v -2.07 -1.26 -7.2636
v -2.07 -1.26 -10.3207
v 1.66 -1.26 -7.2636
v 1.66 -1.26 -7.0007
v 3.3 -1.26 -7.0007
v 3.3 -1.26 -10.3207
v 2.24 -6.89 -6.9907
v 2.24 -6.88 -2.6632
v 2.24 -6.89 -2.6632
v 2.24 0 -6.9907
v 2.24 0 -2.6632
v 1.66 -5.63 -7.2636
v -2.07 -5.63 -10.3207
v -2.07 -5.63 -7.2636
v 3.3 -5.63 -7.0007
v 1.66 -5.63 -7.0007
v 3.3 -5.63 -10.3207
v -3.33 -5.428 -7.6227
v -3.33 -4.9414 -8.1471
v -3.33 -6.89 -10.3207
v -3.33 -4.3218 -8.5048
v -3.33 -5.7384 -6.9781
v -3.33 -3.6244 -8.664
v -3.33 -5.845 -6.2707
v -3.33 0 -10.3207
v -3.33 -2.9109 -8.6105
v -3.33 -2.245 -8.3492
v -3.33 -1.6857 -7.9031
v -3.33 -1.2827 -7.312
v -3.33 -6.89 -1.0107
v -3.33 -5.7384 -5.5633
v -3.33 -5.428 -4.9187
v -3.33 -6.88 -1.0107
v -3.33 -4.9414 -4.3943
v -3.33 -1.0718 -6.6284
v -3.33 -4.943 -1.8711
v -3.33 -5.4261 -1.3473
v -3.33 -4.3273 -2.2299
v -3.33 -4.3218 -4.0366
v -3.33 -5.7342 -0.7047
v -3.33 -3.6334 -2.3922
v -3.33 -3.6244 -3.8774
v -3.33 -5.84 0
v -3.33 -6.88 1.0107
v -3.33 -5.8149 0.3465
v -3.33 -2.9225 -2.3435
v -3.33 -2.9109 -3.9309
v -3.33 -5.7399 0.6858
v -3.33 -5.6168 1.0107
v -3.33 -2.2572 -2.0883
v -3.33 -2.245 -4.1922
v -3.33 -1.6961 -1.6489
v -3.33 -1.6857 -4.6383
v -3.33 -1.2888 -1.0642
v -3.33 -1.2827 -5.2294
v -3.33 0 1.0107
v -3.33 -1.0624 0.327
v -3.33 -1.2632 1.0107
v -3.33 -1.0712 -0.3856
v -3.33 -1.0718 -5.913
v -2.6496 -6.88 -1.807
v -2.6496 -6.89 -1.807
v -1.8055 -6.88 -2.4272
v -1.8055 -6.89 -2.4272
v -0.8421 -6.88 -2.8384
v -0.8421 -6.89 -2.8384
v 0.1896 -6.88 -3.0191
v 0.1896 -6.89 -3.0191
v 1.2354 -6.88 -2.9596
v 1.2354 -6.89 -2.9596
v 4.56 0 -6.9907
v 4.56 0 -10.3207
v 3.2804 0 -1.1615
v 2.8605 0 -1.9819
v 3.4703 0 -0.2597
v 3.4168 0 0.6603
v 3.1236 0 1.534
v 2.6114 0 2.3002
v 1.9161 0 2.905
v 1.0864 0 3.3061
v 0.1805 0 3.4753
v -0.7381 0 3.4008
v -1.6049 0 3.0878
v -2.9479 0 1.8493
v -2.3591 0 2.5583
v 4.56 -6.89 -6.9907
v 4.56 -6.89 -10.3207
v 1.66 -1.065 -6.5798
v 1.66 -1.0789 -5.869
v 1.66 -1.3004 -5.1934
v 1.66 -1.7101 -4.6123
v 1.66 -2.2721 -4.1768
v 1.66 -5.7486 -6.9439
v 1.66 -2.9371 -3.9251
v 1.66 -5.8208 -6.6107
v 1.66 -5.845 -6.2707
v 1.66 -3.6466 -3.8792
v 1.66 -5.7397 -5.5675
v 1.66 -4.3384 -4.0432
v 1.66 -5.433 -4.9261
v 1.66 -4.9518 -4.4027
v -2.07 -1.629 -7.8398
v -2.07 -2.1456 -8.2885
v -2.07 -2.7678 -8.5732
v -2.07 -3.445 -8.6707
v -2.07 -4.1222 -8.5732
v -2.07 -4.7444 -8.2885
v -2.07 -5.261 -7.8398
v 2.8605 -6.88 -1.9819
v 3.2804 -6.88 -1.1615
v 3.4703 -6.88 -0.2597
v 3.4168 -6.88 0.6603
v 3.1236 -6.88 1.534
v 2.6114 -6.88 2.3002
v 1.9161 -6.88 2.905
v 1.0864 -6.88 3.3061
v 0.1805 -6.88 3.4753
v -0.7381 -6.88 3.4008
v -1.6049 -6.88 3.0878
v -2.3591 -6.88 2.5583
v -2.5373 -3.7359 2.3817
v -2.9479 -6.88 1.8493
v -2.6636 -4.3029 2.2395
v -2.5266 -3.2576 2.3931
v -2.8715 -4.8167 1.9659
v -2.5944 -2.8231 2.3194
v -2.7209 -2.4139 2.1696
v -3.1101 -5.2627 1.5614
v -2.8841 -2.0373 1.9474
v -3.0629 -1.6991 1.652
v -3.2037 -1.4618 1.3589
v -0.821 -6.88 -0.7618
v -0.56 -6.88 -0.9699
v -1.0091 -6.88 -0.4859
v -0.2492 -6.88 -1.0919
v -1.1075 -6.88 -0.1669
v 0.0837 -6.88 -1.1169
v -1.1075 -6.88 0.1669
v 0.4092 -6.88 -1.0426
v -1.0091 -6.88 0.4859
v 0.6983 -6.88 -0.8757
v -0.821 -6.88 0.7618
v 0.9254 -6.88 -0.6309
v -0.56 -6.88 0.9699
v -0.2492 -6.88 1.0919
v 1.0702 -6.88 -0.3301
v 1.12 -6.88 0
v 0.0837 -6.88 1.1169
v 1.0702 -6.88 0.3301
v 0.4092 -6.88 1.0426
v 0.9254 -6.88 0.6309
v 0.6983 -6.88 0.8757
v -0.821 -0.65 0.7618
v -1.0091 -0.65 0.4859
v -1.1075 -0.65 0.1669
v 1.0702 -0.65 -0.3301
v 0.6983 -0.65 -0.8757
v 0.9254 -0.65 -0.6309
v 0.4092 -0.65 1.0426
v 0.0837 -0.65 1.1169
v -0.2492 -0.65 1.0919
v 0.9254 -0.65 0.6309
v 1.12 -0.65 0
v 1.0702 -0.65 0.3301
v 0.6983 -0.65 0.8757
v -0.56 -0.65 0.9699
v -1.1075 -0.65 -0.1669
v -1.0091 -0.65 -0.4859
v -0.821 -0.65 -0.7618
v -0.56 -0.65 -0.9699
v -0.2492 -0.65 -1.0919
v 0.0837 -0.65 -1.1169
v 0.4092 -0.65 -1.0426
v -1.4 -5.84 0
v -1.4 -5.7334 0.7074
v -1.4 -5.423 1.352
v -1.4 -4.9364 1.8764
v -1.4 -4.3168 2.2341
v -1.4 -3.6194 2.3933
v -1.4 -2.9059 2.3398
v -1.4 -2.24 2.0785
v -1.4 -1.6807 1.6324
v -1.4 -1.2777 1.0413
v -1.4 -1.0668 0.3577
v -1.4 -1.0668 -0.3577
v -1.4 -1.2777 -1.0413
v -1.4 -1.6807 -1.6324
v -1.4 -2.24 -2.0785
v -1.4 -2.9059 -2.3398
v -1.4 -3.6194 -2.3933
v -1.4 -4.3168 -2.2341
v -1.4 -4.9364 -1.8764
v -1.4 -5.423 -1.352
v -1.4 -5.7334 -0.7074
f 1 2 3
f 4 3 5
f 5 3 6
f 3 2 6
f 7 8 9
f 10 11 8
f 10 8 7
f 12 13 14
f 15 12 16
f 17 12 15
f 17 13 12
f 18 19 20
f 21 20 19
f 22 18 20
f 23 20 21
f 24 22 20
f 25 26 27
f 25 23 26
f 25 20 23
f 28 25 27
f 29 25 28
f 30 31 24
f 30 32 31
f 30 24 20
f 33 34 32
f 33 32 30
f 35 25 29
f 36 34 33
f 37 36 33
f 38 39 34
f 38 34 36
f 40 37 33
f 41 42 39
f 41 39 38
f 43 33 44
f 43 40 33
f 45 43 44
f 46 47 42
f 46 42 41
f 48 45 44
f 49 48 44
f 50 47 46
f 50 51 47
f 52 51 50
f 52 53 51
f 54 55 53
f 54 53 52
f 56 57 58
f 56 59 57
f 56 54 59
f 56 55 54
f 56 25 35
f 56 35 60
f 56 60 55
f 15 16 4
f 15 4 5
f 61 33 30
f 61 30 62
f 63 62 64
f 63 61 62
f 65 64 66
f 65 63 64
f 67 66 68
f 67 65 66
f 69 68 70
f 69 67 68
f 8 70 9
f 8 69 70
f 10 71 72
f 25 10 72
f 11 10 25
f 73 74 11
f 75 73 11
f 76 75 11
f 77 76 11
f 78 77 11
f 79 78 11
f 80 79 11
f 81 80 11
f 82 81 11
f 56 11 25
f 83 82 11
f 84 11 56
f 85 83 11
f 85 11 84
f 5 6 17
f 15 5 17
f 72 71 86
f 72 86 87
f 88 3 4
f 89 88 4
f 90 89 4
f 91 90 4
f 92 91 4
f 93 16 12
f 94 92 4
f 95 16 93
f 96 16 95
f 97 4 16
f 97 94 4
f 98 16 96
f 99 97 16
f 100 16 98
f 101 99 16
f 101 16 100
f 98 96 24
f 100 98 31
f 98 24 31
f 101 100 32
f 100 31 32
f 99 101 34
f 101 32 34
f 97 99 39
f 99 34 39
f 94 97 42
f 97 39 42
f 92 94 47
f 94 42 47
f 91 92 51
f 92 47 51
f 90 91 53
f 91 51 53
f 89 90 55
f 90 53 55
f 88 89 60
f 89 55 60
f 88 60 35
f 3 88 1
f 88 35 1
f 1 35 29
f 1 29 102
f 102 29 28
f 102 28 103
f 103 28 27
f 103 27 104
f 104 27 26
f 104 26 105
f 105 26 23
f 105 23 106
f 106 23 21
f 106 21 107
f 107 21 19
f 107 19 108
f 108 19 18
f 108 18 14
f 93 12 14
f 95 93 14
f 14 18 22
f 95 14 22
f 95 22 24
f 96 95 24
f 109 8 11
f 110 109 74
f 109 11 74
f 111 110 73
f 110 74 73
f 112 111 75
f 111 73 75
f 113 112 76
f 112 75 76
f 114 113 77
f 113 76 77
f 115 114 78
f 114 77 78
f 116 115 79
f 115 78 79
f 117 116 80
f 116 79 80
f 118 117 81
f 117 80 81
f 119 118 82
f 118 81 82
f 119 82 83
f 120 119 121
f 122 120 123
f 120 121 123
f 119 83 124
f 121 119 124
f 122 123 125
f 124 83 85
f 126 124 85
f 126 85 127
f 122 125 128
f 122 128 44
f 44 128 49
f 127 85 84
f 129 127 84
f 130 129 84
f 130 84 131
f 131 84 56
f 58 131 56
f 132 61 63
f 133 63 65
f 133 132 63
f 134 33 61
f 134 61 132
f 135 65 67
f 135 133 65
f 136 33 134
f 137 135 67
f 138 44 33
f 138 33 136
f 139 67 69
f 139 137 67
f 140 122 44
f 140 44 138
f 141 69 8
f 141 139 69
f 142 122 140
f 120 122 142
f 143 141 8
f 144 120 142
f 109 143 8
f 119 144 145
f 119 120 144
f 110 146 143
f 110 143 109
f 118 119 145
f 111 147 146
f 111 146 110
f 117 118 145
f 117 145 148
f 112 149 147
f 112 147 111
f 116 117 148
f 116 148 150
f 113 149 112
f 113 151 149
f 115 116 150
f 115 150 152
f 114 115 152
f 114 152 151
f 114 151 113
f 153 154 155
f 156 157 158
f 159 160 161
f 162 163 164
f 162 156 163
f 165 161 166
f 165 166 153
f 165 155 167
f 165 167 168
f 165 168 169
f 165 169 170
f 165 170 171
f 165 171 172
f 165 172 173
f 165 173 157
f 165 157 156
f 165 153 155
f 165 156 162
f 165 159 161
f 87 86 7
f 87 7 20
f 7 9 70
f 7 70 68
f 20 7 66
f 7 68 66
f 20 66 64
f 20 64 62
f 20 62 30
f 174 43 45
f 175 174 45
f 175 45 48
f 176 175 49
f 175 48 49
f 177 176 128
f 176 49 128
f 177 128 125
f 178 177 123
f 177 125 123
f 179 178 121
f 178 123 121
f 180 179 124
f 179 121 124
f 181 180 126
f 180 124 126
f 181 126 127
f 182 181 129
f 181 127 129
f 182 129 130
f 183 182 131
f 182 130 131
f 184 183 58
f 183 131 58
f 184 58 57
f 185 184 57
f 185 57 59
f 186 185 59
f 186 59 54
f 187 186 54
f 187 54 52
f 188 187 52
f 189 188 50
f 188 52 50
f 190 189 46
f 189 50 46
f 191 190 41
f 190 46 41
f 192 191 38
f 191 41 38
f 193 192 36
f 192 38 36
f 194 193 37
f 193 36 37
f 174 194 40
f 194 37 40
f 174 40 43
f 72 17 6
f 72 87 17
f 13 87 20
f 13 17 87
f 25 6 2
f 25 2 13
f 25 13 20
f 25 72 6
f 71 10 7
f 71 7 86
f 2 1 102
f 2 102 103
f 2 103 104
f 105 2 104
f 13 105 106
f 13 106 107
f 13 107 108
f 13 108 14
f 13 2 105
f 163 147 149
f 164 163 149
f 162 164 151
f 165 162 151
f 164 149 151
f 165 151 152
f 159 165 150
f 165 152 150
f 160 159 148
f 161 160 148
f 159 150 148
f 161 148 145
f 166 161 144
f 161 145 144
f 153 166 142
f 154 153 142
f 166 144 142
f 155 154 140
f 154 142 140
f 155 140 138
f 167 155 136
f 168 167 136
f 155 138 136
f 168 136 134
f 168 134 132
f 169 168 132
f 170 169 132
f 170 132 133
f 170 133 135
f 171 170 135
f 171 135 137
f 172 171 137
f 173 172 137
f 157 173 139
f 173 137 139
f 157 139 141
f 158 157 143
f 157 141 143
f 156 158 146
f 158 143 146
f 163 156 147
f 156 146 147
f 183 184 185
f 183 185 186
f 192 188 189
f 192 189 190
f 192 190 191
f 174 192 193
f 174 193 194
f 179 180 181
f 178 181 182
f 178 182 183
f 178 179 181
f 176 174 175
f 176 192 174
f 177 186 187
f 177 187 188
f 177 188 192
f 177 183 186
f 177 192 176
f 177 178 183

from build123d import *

# Parameters (mm, degrees)
F0_R      = 3.48
F1_DEPTH  = 6.88
F3_DEPTH  = 6.881
F5_DEPTH  = 6.89
F6_W      = 5.37
F6_H      = 4.37
F7_DEPTH  = 3.32
F8_R      = 2.4
F9_DEPTH  = 1.93
F10_R     = 2.4
F11_DEPTH = 4.99
F12_R     = 1.12
F13_DEPTH = 6.23


with BuildPart() as f1:
    # F0 (on Front) → F1 (new body)
    with BuildSketch(Plane.XZ):
        Circle(F0_R)
    extrude(amount=F1_DEPTH)

    # F2 (on face) → F3 (cut, through all)
    with BuildSketch(Plane(origin=(0, 0, 0), x_dir=(-1, 0, 0), z_dir=(0, 1, 0))):
        Polygon((4.844351, 2.141895), (3.33, 4.121852), (3.33, -5.87584), align=None)
    extrude(amount=-F3_DEPTH, mode=Mode.SUBTRACT)

    # F4 (on face) → F5 (join)
    with BuildSketch(Plane(origin=(0, 0, 0), x_dir=(-1, 0, 0), z_dir=(0, 1, 0))):
        with BuildLine():
            Line((3.33, -10.320693), (3.33, -1.010693))
            ThreePointArc((3.33, -1.010693), (0.84212, -2.838426), (-2.24, -2.663231))
            Line((-2.24, -2.663231), (-2.24, -6.990693))
            Line((-2.24, -6.990693), (-4.56, -6.990693))
            Line((-4.56, -6.990693), (-4.56, -10.320693))
            Line((-4.56, -10.320693), (3.33, -10.320693))
        make_face()
    extrude(amount=-F5_DEPTH)

    # F6 (on face) → F7 (cut)
    with BuildSketch(Plane(origin=(0, 0, -10.320693), x_dir=(1, 0, 0), z_dir=(0, 0, -1))):
        with Locations((0.615, 3.445)):
            Rectangle(F6_W, F6_H)
    extrude(amount=-F7_DEPTH, mode=Mode.SUBTRACT)

    # F8 (on face) → F9 (cut)
    with BuildSketch(Plane(origin=(-3.33, 0, 0), x_dir=(0, -1, 0), z_dir=(-1, 0, 0))):
        with Locations((3.44, 0)):
            Circle(F8_R)
    extrude(amount=-F9_DEPTH, mode=Mode.SUBTRACT)

    # F10 (on face) → F11 (cut)
    with BuildSketch(Plane(origin=(-3.33, 0, 0), x_dir=(0, -1, 0), z_dir=(-1, 0, 0))):
        with Locations((3.445, -6.270693)):
            Circle(F10_R)
    extrude(amount=-F11_DEPTH, mode=Mode.SUBTRACT)

    # F12 (on face) → F13 (cut)
    with BuildSketch(Plane.XZ.offset(6.88)):
        Circle(F12_R)
    extrude(amount=-F13_DEPTH, mode=Mode.SUBTRACT)


solid = f1.part
